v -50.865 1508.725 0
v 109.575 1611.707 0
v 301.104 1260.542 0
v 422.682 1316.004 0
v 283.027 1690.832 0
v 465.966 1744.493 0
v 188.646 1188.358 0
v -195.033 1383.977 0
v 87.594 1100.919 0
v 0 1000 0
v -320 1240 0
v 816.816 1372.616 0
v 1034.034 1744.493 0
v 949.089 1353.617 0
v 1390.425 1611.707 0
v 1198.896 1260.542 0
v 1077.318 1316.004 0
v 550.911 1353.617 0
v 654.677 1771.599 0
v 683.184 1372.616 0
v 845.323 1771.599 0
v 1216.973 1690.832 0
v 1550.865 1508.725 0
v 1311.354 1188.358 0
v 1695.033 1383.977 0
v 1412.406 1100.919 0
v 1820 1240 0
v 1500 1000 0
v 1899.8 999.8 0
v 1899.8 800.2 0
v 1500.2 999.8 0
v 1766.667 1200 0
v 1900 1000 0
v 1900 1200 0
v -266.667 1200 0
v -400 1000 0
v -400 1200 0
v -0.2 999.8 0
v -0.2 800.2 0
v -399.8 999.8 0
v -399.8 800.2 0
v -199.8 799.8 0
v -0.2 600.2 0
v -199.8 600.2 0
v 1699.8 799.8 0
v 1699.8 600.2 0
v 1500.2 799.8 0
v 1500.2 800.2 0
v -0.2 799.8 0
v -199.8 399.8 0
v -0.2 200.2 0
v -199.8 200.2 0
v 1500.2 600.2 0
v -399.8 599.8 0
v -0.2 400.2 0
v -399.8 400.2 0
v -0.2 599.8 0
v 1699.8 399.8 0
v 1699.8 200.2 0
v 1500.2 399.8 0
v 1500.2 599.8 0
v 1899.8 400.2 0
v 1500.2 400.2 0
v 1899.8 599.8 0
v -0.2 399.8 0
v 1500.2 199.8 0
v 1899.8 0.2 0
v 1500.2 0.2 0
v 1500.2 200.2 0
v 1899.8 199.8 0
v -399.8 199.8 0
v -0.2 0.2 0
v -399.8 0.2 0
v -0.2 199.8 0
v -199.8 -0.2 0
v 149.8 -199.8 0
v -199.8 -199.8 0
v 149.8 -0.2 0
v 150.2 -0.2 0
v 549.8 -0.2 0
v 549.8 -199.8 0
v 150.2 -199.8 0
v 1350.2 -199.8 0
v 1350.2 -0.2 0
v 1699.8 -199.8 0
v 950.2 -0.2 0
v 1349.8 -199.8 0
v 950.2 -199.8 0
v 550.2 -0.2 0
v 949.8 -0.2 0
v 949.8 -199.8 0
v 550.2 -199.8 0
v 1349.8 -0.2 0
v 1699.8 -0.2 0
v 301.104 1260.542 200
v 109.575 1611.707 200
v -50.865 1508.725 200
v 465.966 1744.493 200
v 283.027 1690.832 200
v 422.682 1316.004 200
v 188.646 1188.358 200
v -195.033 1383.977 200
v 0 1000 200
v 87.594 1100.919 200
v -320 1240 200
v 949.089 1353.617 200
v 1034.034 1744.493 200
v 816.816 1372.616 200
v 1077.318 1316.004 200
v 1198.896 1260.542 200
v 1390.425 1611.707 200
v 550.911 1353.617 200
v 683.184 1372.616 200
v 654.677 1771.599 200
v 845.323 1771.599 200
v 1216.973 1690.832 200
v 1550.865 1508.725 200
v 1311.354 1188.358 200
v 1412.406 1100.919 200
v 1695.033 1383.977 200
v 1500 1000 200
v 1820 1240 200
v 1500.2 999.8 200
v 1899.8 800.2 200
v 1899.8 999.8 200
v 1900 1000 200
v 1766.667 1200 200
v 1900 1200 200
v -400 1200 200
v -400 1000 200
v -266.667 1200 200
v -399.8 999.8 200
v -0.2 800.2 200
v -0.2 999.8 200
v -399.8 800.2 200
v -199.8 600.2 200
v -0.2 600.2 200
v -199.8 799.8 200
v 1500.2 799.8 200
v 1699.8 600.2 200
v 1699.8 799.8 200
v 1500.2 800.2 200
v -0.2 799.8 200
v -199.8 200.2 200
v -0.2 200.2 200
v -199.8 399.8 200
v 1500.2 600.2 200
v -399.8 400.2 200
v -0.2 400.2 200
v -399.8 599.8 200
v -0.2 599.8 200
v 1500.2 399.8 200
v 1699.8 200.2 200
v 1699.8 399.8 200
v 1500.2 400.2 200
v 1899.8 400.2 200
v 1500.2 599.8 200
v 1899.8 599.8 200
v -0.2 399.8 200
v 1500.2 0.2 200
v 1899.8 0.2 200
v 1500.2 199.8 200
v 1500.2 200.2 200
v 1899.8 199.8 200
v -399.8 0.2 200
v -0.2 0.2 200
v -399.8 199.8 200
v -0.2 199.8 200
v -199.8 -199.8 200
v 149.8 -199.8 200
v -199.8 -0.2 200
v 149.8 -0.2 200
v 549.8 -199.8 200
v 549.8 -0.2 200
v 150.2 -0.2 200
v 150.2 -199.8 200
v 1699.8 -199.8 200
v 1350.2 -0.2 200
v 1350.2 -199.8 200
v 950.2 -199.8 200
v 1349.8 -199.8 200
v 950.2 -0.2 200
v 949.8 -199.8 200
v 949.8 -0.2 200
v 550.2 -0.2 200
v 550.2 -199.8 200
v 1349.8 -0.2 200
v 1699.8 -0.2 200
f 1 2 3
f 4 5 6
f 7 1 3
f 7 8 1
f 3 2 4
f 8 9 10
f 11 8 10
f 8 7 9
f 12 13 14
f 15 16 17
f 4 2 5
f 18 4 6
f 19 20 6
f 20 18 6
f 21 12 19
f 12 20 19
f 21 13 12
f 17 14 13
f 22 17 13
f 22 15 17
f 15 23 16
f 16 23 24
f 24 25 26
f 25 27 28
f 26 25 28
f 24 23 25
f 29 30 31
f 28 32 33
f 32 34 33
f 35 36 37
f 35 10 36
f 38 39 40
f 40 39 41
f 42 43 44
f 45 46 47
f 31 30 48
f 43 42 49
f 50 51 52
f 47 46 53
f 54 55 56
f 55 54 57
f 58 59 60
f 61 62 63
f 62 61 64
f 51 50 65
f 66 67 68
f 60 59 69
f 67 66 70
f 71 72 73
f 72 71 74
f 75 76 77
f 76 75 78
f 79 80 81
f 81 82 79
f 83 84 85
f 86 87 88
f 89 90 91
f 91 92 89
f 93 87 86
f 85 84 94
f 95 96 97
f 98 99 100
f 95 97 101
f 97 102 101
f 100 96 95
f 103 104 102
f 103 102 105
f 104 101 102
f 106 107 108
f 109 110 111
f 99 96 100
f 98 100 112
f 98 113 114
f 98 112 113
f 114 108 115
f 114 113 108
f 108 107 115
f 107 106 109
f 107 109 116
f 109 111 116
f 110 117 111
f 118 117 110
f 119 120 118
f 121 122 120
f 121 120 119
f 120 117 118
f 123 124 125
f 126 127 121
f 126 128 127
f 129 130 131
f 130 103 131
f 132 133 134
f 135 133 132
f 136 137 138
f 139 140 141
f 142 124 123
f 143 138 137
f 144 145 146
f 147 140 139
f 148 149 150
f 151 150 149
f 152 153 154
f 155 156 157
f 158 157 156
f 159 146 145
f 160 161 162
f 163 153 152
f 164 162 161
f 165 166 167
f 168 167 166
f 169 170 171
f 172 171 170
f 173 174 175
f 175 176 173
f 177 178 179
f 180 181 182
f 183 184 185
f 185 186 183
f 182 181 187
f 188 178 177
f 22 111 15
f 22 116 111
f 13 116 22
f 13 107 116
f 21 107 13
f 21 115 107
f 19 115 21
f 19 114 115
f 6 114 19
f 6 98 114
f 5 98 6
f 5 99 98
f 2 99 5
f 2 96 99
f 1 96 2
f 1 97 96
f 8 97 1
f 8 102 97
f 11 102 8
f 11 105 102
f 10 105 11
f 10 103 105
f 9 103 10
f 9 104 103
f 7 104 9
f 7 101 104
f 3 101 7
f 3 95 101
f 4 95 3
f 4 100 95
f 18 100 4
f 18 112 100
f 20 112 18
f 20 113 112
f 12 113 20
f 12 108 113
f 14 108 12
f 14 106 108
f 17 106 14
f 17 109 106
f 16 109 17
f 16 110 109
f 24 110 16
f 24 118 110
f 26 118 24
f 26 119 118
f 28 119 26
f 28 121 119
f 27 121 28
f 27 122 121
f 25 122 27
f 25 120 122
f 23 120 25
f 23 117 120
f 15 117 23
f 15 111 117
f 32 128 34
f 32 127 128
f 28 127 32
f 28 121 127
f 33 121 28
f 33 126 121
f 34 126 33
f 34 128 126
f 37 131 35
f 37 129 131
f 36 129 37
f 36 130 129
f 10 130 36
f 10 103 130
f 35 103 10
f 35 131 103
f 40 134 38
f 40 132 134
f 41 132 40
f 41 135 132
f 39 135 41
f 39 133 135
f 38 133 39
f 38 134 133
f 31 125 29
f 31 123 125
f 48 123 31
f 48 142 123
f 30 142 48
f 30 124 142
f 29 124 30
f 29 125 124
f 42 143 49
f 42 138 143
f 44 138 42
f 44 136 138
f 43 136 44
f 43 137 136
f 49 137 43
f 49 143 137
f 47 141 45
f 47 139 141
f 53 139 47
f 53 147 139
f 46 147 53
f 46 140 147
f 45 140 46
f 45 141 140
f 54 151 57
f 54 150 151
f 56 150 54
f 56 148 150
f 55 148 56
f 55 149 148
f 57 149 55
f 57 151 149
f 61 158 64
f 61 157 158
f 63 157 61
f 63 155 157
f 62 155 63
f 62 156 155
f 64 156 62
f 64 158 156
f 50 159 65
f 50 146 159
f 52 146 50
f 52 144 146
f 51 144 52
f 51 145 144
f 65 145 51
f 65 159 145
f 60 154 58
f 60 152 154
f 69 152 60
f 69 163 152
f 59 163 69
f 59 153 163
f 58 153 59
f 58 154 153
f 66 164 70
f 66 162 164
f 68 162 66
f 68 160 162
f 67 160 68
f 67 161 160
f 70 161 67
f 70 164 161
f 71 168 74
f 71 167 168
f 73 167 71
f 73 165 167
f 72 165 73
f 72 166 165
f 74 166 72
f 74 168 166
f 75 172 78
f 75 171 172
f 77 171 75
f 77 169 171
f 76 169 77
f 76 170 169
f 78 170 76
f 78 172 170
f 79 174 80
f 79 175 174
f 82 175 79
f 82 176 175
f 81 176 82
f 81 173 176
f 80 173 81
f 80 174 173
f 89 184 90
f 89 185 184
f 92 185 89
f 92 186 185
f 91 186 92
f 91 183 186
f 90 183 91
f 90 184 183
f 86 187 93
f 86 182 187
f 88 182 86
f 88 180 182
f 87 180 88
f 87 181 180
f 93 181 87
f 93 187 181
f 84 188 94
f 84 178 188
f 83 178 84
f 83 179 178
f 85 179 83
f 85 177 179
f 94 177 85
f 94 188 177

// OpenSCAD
// Generated by Parametrix
ca_door1arc_faceDoor_000 = [ [ 1500.0000, 1000.0000 ],[ 1820.0000, 1240.0000 ],[ 1695.0327, 1383.9774 ],[ 1412.4061, 1100.9187 ],[ 1500.0000, 1000.0000 ] ];
cb_door1arc_faceDoor_000 = [  0, 1, 2, 3, 4 ];
ca_door1arc_faceDoor_001 = [ [ 1412.4061, 1100.9187 ],[ 1695.0327, 1383.9774 ],[ 1550.8646, 1508.7246 ],[ 1311.3537, 1188.3583 ],[ 1412.4061, 1100.9187 ] ];
cb_door1arc_faceDoor_001 = [  5, 6, 7, 8, 9 ];
ca_door1arc_faceDoor_002 = [ [ 1311.3537, 1188.3583 ],[ 1550.8646, 1508.7246 ],[ 1390.4249, 1611.7070 ],[ 1198.8960, 1260.5423 ],[ 1311.3537, 1188.3583 ] ];
cb_door1arc_faceDoor_002 = [  10, 11, 12, 13, 14 ];
ca_door1arc_faceDoor_003 = [ [ 1198.8960, 1260.5423 ],[ 1390.4249, 1611.7070 ],[ 1216.9733, 1690.8324 ],[ 1077.3177, 1316.0041 ],[ 1198.8960, 1260.5423 ] ];
cb_door1arc_faceDoor_003 = [  15, 16, 17, 18, 19 ];
ca_door1arc_faceDoor_004 = [ [ 1077.3177, 1316.0041 ],[ 1216.9733, 1690.8324 ],[ 1034.0338, 1744.4931 ],[ 949.0891, 1353.6167 ],[ 1077.3177, 1316.0041 ] ];
cb_door1arc_faceDoor_004 = [  20, 21, 22, 23, 24 ];
ca_door1arc_faceDoor_005 = [ [ 949.0891, 1353.6167 ],[ 1034.0338, 1744.4931 ],[ 845.3235, 1771.5988 ],[ 816.8156, 1372.6160 ],[ 949.0891, 1353.6167 ] ];
cb_door1arc_faceDoor_005 = [  25, 26, 27, 28, 29 ];
ca_door1arc_faceDoor_006 = [ [ 816.8156, 1372.6160 ],[ 845.3235, 1771.5988 ],[ 654.6765, 1771.5988 ],[ 683.1844, 1372.6160 ],[ 816.8156, 1372.6160 ] ];
cb_door1arc_faceDoor_006 = [  30, 31, 32, 33, 34 ];
ca_door1arc_faceDoor_007 = [ [ 683.1844, 1372.6160 ],[ 654.6765, 1771.5988 ],[ 465.9662, 1744.4931 ],[ 550.9109, 1353.6167 ],[ 683.1844, 1372.6160 ] ];
cb_door1arc_faceDoor_007 = [  35, 36, 37, 38, 39 ];
ca_door1arc_faceDoor_008 = [ [ 550.9109, 1353.6167 ],[ 465.9662, 1744.4931 ],[ 283.0267, 1690.8324 ],[ 422.6823, 1316.0041 ],[ 550.9109, 1353.6167 ] ];
cb_door1arc_faceDoor_008 = [  40, 41, 42, 43, 44 ];
ca_door1arc_faceDoor_009 = [ [ 422.6823, 1316.0041 ],[ 283.0267, 1690.8324 ],[ 109.5751, 1611.7070 ],[ 301.1040, 1260.5423 ],[ 422.6823, 1316.0041 ] ];
cb_door1arc_faceDoor_009 = [  45, 46, 47, 48, 49 ];
ca_door1arc_faceDoor_010 = [ [ 301.1040, 1260.5423 ],[ 109.5751, 1611.7070 ],[ -50.8646, 1508.7246 ],[ 188.6463, 1188.3583 ],[ 301.1040, 1260.5423 ] ];
cb_door1arc_faceDoor_010 = [  50, 51, 52, 53, 54 ];
ca_door1arc_faceDoor_011 = [ [ 188.6463, 1188.3583 ],[ -50.8646, 1508.7246 ],[ -195.0327, 1383.9774 ],[ 87.5939, 1100.9187 ],[ 188.6463, 1188.3583 ] ];
cb_door1arc_faceDoor_011 = [  55, 56, 57, 58, 59 ];
ca_door1arc_faceDoor_012 = [ [ 87.5939, 1100.9187 ],[ -195.0327, 1383.9774 ],[ -320.0000, 1240.0000 ],[ 0.0000, 1000.0000 ],[ 87.5939, 1100.9187 ] ];
cb_door1arc_faceDoor_012 = [  60, 61, 62, 63, 64 ];
ca_door1arc_faceDoor_013 = [ [ -399.8000, 0.2000 ],[ -0.2000, 0.2000 ],[ -0.2000, 199.8000 ],[ -399.8000, 199.8000 ],[ -399.8000, 0.2000 ] ];
cb_door1arc_faceDoor_013 = [  65, 66, 67, 68, 69 ];
ca_door1arc_faceDoor_014 = [ [ 1500.2000, 0.2000 ],[ 1899.8000, 0.2000 ],[ 1899.8000, 199.8000 ],[ 1500.2000, 199.8000 ],[ 1500.2000, 0.2000 ] ];
cb_door1arc_faceDoor_014 = [  70, 71, 72, 73, 74 ];
ca_door1arc_faceDoor_015 = [ [ -199.8000, 200.2000 ],[ -0.2000, 200.2000 ],[ -0.2000, 399.8000 ],[ -199.8000, 399.8000 ],[ -199.8000, 200.2000 ] ];
cb_door1arc_faceDoor_015 = [  75, 76, 77, 78, 79 ];
ca_door1arc_faceDoor_016 = [ [ 1500.2000, 200.2000 ],[ 1699.8000, 200.2000 ],[ 1699.8000, 399.8000 ],[ 1500.2000, 399.8000 ],[ 1500.2000, 200.2000 ] ];
cb_door1arc_faceDoor_016 = [  80, 81, 82, 83, 84 ];
ca_door1arc_faceDoor_017 = [ [ -399.8000, 400.2000 ],[ -0.2000, 400.2000 ],[ -0.2000, 599.8000 ],[ -399.8000, 599.8000 ],[ -399.8000, 400.2000 ] ];
cb_door1arc_faceDoor_017 = [  85, 86, 87, 88, 89 ];
ca_door1arc_faceDoor_018 = [ [ 1500.2000, 400.2000 ],[ 1899.8000, 400.2000 ],[ 1899.8000, 599.8000 ],[ 1500.2000, 599.8000 ],[ 1500.2000, 400.2000 ] ];
cb_door1arc_faceDoor_018 = [  90, 91, 92, 93, 94 ];
ca_door1arc_faceDoor_019 = [ [ -199.8000, 600.2000 ],[ -0.2000, 600.2000 ],[ -0.2000, 799.8000 ],[ -199.8000, 799.8000 ],[ -199.8000, 600.2000 ] ];
cb_door1arc_faceDoor_019 = [  95, 96, 97, 98, 99 ];
ca_door1arc_faceDoor_020 = [ [ 1500.2000, 600.2000 ],[ 1699.8000, 600.2000 ],[ 1699.8000, 799.8000 ],[ 1500.2000, 799.8000 ],[ 1500.2000, 600.2000 ] ];
cb_door1arc_faceDoor_020 = [  100, 101, 102, 103, 104 ];
ca_door1arc_faceDoor_021 = [ [ -399.8000, 800.2000 ],[ -0.2000, 800.2000 ],[ -0.2000, 999.8000 ],[ -399.8000, 999.8000 ],[ -399.8000, 800.2000 ] ];
cb_door1arc_faceDoor_021 = [  105, 106, 107, 108, 109 ];
ca_door1arc_faceDoor_022 = [ [ 1500.2000, 800.2000 ],[ 1899.8000, 800.2000 ],[ 1899.8000, 999.8000 ],[ 1500.2000, 999.8000 ],[ 1500.2000, 800.2000 ] ];
cb_door1arc_faceDoor_022 = [  110, 111, 112, 113, 114 ];
ca_door1arc_faceDoor_023 = [ [ -199.8000, -199.8000 ],[ 149.8000, -199.8000 ],[ 149.8000, -0.2000 ],[ -199.8000, -0.2000 ],[ -199.8000, -199.8000 ] ];
cb_door1arc_faceDoor_023 = [  115, 116, 117, 118, 119 ];
ca_door1arc_faceDoor_024 = [ [ 150.2000, -199.8000 ],[ 549.8000, -199.8000 ],[ 549.8000, -0.2000 ],[ 150.2000, -0.2000 ],[ 150.2000, -199.8000 ] ];
cb_door1arc_faceDoor_024 = [  120, 121, 122, 123, 124 ];
ca_door1arc_faceDoor_025 = [ [ 550.2000, -199.8000 ],[ 949.8000, -199.8000 ],[ 949.8000, -0.2000 ],[ 550.2000, -0.2000 ],[ 550.2000, -199.8000 ] ];
cb_door1arc_faceDoor_025 = [  125, 126, 127, 128, 129 ];
ca_door1arc_faceDoor_026 = [ [ 950.2000, -199.8000 ],[ 1349.8000, -199.8000 ],[ 1349.8000, -0.2000 ],[ 950.2000, -0.2000 ],[ 950.2000, -199.8000 ] ];
cb_door1arc_faceDoor_026 = [  130, 131, 132, 133, 134 ];
ca_door1arc_faceDoor_027 = [ [ 1350.2000, -199.8000 ],[ 1699.8000, -199.8000 ],[ 1699.8000, -0.2000 ],[ 1350.2000, -0.2000 ],[ 1350.2000, -199.8000 ] ];
cb_door1arc_faceDoor_027 = [  135, 136, 137, 138, 139 ];
ca_door1arc_faceDoor_028 = [ [ 0.0000, 1000.0000 ],[ -266.6667, 1200.0000 ],[ -400.0000, 1200.0000 ],[ -400.0000, 1000.0000 ],[ 0.0000, 1000.0000 ] ];
cb_door1arc_faceDoor_028 = [  140, 141, 142, 143, 144 ];
ca_door1arc_faceDoor_029 = [ [ 1500.0000, 1000.0000 ],[ 1766.6667, 1200.0000 ],[ 1900.0000, 1200.0000 ],[ 1900.0000, 1000.0000 ],[ 1500.0000, 1000.0000 ] ];
cb_door1arc_faceDoor_029 = [  145, 146, 147, 148, 149 ];
a_door1arc_faceDoor = concat(ca_door1arc_faceDoor_000, ca_door1arc_faceDoor_001, ca_door1arc_faceDoor_002, ca_door1arc_faceDoor_003, ca_door1arc_faceDoor_004, ca_door1arc_faceDoor_005, ca_door1arc_faceDoor_006, ca_door1arc_faceDoor_007, ca_door1arc_faceDoor_008, ca_door1arc_faceDoor_009, ca_door1arc_faceDoor_010, ca_door1arc_faceDoor_011, ca_door1arc_faceDoor_012, ca_door1arc_faceDoor_013, ca_door1arc_faceDoor_014, ca_door1arc_faceDoor_015, ca_door1arc_faceDoor_016, ca_door1arc_faceDoor_017, ca_door1arc_faceDoor_018, ca_door1arc_faceDoor_019, ca_door1arc_faceDoor_020, ca_door1arc_faceDoor_021, ca_door1arc_faceDoor_022, ca_door1arc_faceDoor_023, ca_door1arc_faceDoor_024, ca_door1arc_faceDoor_025, ca_door1arc_faceDoor_026, ca_door1arc_faceDoor_027, ca_door1arc_faceDoor_028, ca_door1arc_faceDoor_029);
b_door1arc_faceDoor = [cb_door1arc_faceDoor_000, cb_door1arc_faceDoor_001, cb_door1arc_faceDoor_002, cb_door1arc_faceDoor_003, cb_door1arc_faceDoor_004, cb_door1arc_faceDoor_005, cb_door1arc_faceDoor_006, cb_door1arc_faceDoor_007, cb_door1arc_faceDoor_008, cb_door1arc_faceDoor_009, cb_door1arc_faceDoor_010, cb_door1arc_faceDoor_011, cb_door1arc_faceDoor_012, cb_door1arc_faceDoor_013, cb_door1arc_faceDoor_014, cb_door1arc_faceDoor_015, cb_door1arc_faceDoor_016, cb_door1arc_faceDoor_017, cb_door1arc_faceDoor_018, cb_door1arc_faceDoor_019, cb_door1arc_faceDoor_020, cb_door1arc_faceDoor_021, cb_door1arc_faceDoor_022, cb_door1arc_faceDoor_023, cb_door1arc_faceDoor_024, cb_door1arc_faceDoor_025, cb_door1arc_faceDoor_026, cb_door1arc_faceDoor_027, cb_door1arc_faceDoor_028, cb_door1arc_faceDoor_029];

module subpax_door1arc_top () {
	translate( [ 0, 0, 0 ])
		rotate( [ 0, 0, 0 ])
			   linear_extrude(height = 200) polygon(a_door1arc_faceDoor, b_door1arc_faceDoor);
}

module pax_door1arc () {
	subpax_door1arc_top();
}

pax_door1arc();
